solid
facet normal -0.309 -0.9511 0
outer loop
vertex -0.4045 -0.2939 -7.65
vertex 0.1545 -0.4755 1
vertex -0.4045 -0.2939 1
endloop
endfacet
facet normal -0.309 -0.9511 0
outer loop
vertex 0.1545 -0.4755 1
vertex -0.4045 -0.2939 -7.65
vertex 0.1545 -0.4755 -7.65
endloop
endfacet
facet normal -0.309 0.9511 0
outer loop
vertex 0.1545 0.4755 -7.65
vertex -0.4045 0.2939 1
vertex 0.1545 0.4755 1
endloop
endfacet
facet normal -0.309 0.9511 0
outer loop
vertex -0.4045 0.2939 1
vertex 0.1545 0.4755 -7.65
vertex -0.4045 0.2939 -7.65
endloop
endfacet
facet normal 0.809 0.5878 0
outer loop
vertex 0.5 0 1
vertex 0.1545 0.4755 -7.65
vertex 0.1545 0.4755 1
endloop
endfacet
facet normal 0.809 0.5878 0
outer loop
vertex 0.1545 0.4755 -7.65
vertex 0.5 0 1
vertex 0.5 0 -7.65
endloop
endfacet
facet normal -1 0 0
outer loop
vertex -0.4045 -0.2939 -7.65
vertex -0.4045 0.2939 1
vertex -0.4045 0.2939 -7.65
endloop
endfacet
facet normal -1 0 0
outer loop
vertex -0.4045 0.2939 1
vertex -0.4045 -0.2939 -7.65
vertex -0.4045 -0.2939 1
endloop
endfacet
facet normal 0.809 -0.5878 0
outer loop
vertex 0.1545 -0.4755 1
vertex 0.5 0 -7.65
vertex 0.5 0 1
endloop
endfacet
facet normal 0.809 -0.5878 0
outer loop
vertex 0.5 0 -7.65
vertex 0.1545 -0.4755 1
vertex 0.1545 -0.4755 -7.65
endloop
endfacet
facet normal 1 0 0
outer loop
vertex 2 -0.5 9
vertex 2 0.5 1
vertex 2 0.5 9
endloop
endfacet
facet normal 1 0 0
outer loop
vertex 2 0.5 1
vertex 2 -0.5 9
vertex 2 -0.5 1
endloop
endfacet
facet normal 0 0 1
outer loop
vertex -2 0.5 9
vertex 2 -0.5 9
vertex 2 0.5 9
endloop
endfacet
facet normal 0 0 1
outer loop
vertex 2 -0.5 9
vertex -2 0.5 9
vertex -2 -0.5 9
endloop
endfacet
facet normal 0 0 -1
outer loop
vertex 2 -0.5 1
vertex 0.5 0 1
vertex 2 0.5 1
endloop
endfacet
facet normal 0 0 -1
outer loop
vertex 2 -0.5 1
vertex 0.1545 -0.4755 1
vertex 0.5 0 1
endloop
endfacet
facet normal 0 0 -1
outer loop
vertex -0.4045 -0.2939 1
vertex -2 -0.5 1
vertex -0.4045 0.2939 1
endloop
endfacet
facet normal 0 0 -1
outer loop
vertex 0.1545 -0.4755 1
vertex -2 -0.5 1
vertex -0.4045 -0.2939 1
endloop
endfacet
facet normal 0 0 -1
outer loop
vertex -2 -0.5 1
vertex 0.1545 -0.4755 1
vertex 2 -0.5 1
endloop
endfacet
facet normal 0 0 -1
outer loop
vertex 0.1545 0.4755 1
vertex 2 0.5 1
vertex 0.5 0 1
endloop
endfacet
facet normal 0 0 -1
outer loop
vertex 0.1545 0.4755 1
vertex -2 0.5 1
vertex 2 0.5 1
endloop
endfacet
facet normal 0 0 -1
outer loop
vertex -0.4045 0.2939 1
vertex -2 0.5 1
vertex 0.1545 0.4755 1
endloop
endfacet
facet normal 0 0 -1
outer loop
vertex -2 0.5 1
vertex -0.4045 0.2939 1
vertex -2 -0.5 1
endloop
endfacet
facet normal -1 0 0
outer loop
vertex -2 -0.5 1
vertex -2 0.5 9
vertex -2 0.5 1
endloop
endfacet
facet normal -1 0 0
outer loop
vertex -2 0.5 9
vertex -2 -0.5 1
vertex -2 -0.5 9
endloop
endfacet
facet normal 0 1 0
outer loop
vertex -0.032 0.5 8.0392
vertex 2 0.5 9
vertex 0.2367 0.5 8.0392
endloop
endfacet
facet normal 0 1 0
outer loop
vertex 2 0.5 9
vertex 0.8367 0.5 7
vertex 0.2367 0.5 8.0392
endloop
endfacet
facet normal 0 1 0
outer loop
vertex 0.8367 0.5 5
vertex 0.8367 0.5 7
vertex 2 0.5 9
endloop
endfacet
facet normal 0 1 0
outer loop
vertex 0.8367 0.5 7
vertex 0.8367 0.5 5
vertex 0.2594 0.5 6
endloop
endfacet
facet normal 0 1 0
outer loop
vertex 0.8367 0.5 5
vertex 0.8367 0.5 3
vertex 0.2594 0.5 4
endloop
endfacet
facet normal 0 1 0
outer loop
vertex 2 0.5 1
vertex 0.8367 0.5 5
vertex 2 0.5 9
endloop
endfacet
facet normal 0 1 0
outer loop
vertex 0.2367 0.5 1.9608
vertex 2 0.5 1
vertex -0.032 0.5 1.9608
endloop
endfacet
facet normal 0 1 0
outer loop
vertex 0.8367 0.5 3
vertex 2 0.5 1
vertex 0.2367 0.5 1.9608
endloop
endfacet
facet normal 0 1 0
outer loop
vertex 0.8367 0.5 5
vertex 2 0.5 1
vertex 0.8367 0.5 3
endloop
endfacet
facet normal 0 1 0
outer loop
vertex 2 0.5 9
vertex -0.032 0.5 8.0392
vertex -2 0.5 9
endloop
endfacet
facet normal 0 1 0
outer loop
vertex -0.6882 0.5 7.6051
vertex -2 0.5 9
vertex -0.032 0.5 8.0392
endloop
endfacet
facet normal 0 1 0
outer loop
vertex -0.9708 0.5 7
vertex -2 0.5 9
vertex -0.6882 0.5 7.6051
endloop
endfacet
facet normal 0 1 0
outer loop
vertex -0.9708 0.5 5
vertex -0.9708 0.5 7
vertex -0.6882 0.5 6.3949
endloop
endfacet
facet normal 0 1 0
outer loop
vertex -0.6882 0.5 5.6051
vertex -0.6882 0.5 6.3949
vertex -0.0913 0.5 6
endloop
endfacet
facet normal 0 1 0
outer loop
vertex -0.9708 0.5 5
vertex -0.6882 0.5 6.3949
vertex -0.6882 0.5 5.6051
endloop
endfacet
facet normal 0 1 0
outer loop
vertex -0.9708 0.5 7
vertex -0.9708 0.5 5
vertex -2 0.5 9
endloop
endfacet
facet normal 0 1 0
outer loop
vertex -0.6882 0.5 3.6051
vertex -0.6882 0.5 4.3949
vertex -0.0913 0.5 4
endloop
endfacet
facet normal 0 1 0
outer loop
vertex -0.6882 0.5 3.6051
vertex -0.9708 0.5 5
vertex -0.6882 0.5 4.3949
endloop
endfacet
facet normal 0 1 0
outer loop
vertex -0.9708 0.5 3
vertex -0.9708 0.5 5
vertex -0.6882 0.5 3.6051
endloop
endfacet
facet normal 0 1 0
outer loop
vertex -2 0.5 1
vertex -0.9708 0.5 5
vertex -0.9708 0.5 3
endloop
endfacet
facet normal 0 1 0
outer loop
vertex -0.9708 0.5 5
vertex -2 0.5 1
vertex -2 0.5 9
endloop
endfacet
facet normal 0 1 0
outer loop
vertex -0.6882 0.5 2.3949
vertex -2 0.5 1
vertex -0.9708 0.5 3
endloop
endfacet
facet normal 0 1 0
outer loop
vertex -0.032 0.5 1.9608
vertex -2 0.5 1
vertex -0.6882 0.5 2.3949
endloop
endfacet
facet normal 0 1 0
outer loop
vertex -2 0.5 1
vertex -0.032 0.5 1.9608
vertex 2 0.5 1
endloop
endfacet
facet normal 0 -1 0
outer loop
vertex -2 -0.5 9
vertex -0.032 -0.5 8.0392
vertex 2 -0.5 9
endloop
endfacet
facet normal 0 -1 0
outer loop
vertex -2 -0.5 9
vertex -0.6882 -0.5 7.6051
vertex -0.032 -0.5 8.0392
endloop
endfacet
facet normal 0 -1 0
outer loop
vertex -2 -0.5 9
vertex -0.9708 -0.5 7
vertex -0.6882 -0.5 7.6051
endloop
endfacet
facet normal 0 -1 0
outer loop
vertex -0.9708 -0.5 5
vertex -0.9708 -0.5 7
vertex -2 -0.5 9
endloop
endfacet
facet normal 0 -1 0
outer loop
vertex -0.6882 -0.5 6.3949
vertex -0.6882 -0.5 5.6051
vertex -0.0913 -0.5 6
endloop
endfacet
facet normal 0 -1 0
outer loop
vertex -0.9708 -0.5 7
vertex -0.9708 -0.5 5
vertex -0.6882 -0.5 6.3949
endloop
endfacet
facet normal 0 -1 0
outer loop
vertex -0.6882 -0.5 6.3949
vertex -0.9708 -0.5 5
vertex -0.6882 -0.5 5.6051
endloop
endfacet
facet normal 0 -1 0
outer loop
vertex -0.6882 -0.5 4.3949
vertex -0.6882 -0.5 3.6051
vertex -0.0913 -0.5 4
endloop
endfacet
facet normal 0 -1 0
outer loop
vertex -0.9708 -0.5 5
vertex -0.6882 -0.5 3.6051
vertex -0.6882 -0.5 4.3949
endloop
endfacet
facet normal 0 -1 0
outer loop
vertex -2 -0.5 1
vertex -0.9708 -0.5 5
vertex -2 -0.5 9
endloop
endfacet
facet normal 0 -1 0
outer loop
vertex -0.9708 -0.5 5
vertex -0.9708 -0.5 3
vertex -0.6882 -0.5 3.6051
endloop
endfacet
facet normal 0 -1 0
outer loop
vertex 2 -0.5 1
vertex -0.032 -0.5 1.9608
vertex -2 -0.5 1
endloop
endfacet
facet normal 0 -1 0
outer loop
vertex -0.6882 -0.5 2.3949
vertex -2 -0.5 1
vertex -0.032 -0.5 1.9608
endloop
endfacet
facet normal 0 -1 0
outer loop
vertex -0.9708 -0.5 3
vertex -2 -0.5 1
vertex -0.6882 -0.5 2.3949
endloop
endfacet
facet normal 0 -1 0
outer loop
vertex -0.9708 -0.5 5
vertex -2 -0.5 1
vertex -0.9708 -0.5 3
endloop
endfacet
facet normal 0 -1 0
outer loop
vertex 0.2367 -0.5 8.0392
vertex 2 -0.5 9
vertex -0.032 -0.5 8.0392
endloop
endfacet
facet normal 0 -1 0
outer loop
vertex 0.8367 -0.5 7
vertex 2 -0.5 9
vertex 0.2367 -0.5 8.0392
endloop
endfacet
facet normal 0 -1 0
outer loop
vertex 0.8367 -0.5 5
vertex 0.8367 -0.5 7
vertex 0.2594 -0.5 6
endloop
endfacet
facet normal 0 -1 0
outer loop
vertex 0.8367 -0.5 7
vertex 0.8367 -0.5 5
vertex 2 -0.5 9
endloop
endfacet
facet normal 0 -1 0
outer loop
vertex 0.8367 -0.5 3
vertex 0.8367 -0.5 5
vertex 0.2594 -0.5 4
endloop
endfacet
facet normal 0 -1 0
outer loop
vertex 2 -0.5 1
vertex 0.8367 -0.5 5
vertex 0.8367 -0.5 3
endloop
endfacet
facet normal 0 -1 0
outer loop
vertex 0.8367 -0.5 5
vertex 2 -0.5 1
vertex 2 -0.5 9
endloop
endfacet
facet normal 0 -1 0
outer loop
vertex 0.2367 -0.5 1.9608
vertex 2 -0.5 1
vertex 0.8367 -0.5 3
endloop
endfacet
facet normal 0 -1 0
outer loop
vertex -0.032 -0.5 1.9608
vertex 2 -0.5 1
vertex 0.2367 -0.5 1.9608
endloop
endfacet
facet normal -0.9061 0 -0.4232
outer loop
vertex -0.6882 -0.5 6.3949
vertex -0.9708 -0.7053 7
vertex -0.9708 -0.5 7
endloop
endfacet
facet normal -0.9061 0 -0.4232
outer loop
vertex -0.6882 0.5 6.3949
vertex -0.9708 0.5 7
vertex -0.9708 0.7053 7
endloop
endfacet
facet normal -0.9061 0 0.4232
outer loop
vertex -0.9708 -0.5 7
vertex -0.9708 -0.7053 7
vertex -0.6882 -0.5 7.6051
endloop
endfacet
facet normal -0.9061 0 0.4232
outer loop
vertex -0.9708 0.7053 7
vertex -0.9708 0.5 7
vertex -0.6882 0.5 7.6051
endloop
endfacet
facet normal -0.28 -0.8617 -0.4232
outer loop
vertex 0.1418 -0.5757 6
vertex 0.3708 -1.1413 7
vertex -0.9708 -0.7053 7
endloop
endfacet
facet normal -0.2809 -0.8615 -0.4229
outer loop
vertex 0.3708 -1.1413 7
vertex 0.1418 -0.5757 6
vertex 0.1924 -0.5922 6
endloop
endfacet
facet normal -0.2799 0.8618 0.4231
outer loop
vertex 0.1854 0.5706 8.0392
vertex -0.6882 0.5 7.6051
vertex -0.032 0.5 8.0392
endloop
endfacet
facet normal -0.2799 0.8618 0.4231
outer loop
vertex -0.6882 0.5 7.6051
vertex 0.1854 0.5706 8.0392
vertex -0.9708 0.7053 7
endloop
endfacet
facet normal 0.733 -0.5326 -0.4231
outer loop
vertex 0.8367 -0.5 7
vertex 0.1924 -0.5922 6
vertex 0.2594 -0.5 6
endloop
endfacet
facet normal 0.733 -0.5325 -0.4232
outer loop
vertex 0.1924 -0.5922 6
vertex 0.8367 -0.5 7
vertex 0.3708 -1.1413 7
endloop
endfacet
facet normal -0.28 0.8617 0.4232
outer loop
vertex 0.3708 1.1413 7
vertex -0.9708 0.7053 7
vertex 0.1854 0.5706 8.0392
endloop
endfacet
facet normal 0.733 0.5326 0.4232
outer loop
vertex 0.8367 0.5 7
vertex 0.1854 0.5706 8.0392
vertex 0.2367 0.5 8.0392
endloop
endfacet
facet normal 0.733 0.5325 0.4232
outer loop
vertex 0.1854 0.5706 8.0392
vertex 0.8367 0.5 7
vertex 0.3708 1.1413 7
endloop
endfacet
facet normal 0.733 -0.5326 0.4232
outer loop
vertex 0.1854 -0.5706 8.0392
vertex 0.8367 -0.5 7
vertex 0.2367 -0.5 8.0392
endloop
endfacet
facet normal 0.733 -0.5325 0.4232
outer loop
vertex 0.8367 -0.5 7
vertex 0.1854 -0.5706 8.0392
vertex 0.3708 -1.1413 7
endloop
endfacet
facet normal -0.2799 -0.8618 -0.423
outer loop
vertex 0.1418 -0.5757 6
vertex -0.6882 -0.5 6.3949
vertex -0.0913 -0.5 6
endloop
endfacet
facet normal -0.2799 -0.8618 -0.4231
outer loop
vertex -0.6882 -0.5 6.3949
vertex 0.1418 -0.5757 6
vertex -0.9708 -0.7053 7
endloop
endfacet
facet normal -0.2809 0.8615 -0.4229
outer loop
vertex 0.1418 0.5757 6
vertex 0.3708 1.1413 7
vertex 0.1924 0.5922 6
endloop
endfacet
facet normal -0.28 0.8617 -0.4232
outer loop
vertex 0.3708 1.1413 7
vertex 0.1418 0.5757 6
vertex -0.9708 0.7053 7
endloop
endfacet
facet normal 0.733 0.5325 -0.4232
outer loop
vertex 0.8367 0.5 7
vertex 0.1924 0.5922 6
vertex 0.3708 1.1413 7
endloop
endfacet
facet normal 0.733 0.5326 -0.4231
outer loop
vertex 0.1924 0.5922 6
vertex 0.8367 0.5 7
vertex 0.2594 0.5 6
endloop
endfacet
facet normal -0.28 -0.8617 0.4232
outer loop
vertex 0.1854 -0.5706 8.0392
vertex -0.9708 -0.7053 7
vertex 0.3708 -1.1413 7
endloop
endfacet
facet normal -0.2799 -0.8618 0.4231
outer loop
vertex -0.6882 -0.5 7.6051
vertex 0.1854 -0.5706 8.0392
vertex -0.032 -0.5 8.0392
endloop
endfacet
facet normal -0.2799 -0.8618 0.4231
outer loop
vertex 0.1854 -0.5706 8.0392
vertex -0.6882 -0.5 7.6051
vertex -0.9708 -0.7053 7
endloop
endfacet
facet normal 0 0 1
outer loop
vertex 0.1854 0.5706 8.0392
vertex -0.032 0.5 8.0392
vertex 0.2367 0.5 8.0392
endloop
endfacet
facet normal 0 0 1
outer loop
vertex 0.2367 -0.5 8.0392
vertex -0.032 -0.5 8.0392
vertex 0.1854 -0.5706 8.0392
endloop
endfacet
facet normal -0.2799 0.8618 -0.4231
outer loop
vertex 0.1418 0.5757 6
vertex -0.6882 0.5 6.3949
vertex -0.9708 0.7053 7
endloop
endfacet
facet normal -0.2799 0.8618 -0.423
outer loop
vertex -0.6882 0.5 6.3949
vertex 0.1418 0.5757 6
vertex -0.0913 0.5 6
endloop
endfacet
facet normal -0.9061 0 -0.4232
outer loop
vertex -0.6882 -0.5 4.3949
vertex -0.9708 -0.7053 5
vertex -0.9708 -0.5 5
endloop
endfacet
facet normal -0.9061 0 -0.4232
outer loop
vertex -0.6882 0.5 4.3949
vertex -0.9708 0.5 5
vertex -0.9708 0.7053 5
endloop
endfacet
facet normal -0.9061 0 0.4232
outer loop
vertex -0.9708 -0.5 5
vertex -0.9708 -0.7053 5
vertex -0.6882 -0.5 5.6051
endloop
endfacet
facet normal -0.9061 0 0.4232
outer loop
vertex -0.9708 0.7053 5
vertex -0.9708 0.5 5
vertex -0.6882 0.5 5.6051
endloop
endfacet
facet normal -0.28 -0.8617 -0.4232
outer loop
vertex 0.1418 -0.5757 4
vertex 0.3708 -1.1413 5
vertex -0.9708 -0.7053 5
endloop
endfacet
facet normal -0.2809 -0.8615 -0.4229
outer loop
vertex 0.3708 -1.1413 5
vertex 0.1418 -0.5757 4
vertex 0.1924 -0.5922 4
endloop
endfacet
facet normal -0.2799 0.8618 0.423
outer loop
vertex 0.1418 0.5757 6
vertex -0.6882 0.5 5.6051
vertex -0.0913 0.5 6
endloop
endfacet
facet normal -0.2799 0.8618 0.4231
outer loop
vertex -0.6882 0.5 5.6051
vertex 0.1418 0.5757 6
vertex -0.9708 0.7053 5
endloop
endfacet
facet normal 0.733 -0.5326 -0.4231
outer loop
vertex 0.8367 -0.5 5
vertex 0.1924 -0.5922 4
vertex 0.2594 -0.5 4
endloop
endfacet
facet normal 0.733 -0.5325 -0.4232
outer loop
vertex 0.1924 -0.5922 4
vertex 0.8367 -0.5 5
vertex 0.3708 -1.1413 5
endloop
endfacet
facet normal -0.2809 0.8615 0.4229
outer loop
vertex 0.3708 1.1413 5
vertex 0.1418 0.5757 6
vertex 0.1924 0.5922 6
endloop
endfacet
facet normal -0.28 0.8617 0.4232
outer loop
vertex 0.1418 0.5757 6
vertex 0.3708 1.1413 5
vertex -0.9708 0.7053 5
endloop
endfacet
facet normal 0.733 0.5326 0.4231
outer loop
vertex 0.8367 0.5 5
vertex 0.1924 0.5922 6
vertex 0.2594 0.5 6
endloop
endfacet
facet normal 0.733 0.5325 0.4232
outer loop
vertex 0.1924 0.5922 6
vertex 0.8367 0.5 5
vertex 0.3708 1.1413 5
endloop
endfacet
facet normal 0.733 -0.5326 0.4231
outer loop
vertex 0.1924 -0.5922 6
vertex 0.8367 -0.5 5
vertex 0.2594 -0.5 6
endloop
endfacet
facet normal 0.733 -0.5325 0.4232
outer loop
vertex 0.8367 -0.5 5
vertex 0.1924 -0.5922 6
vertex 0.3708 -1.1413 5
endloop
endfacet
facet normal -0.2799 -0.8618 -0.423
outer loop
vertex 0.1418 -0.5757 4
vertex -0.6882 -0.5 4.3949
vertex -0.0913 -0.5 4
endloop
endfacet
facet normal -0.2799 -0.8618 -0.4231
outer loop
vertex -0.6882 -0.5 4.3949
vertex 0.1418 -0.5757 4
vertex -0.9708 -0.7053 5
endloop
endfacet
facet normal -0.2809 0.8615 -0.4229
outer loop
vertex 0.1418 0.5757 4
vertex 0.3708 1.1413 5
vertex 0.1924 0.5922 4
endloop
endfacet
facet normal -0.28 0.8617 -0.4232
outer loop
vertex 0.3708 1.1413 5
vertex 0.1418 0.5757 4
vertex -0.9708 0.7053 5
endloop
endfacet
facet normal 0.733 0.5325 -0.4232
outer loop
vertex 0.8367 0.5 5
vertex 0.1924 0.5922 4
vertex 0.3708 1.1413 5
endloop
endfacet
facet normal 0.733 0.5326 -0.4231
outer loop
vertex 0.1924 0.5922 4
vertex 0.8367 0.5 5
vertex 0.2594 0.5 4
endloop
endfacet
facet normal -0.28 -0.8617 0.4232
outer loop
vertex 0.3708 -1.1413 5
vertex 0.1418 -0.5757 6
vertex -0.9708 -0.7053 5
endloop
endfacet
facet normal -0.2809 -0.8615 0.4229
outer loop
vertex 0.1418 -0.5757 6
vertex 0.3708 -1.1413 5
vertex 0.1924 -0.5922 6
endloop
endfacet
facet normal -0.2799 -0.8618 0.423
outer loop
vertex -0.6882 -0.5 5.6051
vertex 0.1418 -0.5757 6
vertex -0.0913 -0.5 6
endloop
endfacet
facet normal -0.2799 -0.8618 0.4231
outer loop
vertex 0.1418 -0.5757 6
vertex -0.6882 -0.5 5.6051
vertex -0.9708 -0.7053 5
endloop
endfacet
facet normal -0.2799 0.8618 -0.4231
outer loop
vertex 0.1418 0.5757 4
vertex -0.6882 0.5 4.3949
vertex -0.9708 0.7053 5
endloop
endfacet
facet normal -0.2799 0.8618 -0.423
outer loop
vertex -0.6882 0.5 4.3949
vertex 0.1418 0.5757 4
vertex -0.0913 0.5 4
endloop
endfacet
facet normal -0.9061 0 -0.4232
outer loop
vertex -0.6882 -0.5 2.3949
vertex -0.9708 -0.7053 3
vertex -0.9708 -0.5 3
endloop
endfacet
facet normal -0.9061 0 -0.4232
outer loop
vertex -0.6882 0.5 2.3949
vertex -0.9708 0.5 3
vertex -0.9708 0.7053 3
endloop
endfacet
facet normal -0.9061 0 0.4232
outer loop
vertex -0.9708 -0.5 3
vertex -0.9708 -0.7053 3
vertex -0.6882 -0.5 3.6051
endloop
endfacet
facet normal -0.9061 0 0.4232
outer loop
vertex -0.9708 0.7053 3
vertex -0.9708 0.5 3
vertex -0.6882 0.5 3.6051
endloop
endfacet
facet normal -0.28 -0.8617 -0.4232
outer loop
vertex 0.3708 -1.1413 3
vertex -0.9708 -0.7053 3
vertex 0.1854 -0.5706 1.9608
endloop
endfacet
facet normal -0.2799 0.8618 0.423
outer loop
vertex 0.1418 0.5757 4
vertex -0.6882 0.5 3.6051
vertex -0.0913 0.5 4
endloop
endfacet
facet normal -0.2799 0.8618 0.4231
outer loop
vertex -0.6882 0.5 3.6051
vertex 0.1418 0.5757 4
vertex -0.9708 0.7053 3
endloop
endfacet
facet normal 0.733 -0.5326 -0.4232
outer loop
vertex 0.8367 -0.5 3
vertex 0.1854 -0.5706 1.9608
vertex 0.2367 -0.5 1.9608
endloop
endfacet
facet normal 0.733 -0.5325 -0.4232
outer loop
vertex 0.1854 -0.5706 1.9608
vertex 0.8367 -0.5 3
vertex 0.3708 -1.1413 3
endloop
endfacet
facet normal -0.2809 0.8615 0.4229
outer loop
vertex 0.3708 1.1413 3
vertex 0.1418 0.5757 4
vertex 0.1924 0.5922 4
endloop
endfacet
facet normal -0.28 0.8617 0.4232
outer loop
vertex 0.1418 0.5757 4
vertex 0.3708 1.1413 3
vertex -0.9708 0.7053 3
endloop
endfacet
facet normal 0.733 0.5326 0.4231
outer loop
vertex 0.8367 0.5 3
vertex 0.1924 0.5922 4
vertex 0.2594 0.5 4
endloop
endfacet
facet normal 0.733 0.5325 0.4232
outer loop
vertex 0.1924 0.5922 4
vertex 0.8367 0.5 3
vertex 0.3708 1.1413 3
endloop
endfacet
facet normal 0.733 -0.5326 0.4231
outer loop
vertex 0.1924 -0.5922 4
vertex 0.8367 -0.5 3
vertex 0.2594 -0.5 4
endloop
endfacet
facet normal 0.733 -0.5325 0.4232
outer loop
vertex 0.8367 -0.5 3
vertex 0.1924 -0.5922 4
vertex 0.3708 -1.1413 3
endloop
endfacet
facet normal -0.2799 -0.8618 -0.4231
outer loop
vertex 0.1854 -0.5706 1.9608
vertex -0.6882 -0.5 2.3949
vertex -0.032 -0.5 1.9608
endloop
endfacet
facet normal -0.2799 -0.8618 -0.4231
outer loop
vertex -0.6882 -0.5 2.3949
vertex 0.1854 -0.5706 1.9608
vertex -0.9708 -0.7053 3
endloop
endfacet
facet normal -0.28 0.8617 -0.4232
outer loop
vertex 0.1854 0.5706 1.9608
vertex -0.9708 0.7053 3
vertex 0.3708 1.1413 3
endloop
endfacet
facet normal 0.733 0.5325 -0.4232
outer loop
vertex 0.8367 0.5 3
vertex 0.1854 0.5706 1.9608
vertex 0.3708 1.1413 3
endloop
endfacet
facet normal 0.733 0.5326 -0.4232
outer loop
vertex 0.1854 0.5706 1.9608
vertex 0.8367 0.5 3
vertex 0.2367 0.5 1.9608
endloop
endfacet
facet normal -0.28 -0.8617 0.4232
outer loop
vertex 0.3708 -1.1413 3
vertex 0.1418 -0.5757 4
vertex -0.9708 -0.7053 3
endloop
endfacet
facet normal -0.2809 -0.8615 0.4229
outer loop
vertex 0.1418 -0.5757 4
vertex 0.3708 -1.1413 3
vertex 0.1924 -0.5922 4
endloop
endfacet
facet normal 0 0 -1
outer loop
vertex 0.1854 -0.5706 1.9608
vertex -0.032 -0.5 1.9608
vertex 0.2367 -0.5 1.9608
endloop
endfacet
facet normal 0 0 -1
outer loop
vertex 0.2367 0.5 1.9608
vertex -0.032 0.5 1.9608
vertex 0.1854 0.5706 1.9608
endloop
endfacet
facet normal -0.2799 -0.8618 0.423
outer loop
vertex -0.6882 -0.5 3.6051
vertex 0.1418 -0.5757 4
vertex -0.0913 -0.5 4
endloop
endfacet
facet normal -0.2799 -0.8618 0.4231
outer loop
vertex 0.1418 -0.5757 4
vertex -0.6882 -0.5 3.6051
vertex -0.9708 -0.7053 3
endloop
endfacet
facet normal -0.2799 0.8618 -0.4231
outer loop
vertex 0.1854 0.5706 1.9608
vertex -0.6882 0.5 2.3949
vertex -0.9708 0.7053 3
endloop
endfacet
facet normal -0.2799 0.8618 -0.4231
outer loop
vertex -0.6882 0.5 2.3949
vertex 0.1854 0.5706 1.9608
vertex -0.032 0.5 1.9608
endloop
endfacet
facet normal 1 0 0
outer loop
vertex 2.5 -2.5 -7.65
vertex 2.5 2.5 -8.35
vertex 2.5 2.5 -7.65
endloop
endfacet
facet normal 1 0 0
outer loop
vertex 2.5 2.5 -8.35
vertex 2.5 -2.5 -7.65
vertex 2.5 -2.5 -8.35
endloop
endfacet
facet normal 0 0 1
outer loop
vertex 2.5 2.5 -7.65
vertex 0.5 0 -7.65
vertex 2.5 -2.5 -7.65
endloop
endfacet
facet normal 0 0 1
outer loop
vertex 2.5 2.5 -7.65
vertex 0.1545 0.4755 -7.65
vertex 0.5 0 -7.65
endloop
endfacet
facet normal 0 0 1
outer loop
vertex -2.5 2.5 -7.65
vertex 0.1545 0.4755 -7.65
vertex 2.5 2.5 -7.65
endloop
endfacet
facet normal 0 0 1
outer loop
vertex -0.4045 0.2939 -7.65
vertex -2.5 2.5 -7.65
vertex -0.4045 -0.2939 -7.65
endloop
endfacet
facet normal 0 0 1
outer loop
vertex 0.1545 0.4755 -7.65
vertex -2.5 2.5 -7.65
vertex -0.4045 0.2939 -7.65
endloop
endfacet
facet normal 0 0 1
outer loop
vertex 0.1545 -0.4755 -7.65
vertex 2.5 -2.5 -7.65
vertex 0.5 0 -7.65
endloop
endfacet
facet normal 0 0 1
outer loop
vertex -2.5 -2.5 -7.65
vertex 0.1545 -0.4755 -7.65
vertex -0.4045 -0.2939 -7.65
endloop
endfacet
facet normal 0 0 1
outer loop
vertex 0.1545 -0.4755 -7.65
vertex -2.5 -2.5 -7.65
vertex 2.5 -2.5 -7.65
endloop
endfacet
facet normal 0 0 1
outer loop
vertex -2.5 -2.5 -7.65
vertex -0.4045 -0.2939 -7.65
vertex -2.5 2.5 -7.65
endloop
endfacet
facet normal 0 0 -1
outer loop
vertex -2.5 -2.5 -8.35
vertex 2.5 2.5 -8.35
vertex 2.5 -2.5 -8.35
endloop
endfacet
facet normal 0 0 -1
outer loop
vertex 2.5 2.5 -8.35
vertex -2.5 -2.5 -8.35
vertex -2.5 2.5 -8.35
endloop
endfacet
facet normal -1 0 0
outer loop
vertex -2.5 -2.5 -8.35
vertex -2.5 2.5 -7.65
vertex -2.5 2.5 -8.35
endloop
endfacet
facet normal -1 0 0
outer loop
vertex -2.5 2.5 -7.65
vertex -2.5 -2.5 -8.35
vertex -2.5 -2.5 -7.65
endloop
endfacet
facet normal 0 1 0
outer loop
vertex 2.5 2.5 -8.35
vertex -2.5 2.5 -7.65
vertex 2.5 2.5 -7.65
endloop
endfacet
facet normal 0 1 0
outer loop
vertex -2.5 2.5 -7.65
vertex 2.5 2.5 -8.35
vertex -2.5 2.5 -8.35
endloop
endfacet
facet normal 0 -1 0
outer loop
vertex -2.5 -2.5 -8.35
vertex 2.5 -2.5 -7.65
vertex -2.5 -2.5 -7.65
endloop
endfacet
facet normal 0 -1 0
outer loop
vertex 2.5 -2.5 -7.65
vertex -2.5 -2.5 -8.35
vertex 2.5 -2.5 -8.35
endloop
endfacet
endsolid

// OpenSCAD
module signal_light(z=0) {
  translate([0,0,z])
    sphere(r=1.2);
}

module railway_signal() {
  union() {
    cylinder(h=16, r=0.5, center=true);
    translate([0,0,5])
      cube([4,1,8], center=true);
    signal_light(7);
    signal_light(5);
    signal_light(3);
    translate([0,0,-8])
      cube([5,5,0.7], center=true);
  }
}

railway_signal();
